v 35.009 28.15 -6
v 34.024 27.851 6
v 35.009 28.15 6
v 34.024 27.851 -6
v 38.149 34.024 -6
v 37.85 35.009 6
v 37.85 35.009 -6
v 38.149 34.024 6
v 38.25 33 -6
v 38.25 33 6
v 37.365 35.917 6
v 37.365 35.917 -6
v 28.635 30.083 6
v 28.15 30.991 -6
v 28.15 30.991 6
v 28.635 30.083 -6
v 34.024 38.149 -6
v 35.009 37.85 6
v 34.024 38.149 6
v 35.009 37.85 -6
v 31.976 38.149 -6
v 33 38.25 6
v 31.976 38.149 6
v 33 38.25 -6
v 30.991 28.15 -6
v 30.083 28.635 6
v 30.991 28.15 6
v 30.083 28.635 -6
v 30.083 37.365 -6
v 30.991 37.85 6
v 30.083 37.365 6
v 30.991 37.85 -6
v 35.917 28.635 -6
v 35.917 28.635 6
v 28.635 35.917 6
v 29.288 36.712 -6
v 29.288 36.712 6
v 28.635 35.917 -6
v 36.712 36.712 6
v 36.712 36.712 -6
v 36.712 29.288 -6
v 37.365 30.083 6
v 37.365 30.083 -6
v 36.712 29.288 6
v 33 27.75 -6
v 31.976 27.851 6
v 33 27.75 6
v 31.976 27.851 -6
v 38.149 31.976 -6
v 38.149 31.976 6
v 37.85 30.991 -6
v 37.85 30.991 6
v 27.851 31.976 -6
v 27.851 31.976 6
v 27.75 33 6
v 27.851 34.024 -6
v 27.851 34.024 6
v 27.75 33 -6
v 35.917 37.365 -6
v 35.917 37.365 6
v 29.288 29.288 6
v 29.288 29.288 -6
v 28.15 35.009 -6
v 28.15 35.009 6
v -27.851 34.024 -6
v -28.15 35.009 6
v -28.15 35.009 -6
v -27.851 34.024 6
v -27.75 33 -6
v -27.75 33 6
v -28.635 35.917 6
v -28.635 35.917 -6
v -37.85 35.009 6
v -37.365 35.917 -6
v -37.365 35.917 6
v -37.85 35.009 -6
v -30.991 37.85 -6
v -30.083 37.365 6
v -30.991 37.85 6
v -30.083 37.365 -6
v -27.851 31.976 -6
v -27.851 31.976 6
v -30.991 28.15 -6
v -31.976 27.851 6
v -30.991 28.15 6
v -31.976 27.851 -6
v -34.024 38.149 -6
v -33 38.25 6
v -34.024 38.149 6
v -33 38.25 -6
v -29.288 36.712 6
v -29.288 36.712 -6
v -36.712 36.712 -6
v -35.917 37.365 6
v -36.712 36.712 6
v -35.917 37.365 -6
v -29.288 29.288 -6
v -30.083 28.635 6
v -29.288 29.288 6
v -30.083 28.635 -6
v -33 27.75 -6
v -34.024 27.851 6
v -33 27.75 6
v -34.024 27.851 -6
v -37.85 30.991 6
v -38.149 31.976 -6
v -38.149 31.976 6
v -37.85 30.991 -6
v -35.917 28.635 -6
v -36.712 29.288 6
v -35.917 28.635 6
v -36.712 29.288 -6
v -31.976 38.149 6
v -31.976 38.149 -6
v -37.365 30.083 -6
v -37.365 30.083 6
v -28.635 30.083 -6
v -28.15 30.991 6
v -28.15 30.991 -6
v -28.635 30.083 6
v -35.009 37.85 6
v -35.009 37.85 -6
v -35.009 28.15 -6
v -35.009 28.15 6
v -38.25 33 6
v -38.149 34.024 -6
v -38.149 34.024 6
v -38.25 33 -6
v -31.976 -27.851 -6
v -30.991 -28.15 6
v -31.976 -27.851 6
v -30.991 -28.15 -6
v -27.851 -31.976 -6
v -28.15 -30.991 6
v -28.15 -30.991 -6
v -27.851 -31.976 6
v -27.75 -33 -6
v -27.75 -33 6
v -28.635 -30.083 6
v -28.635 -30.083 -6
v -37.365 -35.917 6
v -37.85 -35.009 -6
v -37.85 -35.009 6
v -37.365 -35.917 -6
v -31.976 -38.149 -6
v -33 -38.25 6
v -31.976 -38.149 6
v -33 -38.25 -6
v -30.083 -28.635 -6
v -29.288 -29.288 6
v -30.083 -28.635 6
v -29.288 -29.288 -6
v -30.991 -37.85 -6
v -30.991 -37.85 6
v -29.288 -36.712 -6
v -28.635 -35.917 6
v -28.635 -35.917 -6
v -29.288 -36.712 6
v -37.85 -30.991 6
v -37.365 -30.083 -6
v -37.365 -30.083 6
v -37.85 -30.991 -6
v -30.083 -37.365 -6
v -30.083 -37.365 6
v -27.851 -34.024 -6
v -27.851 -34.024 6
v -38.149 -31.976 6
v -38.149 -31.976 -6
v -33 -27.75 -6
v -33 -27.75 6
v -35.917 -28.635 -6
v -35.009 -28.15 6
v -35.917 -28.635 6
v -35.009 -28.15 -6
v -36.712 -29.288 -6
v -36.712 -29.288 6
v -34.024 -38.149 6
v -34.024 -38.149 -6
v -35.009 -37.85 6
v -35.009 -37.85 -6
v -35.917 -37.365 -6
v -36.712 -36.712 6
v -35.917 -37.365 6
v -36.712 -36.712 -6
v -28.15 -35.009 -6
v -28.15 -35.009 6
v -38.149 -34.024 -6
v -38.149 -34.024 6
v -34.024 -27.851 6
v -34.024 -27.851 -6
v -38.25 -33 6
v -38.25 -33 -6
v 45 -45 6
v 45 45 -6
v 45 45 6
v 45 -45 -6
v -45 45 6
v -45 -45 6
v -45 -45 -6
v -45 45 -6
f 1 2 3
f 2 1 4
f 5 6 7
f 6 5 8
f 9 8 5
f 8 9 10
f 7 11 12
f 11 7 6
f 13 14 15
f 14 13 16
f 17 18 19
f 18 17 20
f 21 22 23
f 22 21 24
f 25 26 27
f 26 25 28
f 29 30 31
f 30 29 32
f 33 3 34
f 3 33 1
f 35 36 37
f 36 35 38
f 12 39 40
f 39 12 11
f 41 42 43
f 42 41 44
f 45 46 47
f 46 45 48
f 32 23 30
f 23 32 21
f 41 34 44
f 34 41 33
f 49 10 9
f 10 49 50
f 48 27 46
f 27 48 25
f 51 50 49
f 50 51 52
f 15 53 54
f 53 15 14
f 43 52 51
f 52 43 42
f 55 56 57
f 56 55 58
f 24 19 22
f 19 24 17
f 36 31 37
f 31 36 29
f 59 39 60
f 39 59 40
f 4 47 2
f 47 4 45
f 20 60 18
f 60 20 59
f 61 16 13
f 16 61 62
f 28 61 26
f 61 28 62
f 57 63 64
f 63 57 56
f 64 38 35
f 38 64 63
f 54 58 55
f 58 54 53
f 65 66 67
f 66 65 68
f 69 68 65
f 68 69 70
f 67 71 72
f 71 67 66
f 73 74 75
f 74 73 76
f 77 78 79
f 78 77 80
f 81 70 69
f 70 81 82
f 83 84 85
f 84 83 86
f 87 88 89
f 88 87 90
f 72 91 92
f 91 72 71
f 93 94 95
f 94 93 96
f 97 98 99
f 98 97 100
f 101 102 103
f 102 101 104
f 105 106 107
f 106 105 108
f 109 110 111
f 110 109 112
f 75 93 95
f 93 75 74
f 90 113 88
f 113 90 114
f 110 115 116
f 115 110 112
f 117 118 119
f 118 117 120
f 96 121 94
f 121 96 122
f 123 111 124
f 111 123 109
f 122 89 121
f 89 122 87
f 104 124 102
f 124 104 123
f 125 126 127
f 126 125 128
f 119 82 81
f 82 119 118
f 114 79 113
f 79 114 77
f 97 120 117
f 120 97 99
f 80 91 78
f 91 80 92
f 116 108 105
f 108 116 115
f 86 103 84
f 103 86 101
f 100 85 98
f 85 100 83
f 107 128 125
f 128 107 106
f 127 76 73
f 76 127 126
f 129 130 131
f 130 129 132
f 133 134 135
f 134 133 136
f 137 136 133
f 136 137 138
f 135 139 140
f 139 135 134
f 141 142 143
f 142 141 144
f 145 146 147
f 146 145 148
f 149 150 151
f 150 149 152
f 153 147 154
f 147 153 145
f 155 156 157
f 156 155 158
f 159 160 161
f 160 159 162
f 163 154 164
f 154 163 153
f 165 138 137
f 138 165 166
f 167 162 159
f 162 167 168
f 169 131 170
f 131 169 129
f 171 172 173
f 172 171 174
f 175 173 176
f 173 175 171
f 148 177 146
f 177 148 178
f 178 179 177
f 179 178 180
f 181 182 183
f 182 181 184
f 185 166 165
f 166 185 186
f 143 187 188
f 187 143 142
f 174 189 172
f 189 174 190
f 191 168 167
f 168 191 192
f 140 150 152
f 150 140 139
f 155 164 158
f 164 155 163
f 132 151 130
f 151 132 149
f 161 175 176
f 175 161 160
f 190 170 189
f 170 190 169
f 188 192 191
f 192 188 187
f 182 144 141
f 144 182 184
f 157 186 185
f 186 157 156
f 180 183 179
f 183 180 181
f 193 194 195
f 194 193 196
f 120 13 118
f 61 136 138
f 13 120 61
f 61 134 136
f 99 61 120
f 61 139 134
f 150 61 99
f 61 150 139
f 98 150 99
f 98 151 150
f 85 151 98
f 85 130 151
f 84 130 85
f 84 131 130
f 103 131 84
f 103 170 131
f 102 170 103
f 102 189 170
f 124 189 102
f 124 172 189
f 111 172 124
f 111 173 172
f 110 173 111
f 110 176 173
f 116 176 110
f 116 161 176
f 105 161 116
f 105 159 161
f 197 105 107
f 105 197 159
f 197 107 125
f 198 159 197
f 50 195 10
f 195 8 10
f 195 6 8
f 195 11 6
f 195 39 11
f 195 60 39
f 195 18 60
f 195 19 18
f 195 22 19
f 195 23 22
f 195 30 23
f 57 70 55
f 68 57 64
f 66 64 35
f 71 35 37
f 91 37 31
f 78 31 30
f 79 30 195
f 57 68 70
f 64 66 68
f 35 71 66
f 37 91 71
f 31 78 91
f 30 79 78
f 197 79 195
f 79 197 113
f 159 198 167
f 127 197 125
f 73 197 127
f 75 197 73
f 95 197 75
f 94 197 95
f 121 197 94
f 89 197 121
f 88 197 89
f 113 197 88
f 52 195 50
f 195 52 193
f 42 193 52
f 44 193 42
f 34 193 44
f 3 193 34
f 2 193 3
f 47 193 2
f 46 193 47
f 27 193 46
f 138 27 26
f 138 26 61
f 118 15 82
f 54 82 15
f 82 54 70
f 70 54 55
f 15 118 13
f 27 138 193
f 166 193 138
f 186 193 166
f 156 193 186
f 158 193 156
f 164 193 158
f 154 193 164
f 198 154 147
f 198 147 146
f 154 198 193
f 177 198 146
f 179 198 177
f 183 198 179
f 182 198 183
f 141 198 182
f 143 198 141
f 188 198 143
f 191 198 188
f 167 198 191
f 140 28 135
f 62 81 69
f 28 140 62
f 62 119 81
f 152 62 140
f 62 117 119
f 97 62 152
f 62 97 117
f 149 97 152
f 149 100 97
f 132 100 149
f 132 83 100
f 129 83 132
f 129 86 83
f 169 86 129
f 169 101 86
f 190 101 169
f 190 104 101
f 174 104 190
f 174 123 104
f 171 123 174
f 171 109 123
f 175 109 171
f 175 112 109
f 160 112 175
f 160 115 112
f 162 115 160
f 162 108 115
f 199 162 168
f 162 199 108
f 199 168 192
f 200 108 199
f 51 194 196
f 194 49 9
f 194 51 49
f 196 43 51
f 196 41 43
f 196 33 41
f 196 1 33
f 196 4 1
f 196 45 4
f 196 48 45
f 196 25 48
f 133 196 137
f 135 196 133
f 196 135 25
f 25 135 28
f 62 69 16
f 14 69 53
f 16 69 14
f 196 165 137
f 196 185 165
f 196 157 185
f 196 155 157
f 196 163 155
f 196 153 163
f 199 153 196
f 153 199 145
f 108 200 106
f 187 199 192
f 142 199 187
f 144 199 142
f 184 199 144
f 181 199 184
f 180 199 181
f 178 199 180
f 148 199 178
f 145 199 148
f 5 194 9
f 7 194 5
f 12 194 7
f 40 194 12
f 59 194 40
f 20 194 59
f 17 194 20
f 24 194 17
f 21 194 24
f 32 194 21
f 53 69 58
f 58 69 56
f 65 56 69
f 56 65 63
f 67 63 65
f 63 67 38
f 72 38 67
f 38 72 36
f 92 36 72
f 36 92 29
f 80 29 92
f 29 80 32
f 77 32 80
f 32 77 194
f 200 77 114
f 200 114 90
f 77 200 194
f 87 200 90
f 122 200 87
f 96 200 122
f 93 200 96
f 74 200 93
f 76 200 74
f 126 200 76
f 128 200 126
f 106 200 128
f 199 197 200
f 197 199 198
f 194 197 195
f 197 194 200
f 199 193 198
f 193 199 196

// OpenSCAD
$fn = 32;

// ----------------------------------------------------------------------
// Corner plate 90 x 90 x 12
// 3 holes, centres taken from the edge offset
// ----------------------------------------------------------------------

// --- parameters (mm) ---
plate = [90, 90, 12];  // overall size (x, y, z)
holes = 3;             // number of holes the drawing asks for
hole_d = 10.5;         // hole diameter
edge = 12;             // hole centre offset from the plate edge

// --- derived feature positions (mm) ---
corner_x = plate[0] / 2 - edge;  // = 33   corner hole X
corner_y = plate[1] / 2 - edge;  // = 33   corner hole Y
feature_centers = [
  [corner_x, corner_y],
  [-corner_x, corner_y],
  [-corner_x, -corner_y]
];   // hole centres the loop below drills

// plate outline, every hole drilled through with the same cutters
difference() {
  cube(plate, center = true);
  for (centre = feature_centers)
    translate([centre[0], centre[1], 0])
      cylinder(d = hole_d, h = plate[2] + 2, center = true);
}
